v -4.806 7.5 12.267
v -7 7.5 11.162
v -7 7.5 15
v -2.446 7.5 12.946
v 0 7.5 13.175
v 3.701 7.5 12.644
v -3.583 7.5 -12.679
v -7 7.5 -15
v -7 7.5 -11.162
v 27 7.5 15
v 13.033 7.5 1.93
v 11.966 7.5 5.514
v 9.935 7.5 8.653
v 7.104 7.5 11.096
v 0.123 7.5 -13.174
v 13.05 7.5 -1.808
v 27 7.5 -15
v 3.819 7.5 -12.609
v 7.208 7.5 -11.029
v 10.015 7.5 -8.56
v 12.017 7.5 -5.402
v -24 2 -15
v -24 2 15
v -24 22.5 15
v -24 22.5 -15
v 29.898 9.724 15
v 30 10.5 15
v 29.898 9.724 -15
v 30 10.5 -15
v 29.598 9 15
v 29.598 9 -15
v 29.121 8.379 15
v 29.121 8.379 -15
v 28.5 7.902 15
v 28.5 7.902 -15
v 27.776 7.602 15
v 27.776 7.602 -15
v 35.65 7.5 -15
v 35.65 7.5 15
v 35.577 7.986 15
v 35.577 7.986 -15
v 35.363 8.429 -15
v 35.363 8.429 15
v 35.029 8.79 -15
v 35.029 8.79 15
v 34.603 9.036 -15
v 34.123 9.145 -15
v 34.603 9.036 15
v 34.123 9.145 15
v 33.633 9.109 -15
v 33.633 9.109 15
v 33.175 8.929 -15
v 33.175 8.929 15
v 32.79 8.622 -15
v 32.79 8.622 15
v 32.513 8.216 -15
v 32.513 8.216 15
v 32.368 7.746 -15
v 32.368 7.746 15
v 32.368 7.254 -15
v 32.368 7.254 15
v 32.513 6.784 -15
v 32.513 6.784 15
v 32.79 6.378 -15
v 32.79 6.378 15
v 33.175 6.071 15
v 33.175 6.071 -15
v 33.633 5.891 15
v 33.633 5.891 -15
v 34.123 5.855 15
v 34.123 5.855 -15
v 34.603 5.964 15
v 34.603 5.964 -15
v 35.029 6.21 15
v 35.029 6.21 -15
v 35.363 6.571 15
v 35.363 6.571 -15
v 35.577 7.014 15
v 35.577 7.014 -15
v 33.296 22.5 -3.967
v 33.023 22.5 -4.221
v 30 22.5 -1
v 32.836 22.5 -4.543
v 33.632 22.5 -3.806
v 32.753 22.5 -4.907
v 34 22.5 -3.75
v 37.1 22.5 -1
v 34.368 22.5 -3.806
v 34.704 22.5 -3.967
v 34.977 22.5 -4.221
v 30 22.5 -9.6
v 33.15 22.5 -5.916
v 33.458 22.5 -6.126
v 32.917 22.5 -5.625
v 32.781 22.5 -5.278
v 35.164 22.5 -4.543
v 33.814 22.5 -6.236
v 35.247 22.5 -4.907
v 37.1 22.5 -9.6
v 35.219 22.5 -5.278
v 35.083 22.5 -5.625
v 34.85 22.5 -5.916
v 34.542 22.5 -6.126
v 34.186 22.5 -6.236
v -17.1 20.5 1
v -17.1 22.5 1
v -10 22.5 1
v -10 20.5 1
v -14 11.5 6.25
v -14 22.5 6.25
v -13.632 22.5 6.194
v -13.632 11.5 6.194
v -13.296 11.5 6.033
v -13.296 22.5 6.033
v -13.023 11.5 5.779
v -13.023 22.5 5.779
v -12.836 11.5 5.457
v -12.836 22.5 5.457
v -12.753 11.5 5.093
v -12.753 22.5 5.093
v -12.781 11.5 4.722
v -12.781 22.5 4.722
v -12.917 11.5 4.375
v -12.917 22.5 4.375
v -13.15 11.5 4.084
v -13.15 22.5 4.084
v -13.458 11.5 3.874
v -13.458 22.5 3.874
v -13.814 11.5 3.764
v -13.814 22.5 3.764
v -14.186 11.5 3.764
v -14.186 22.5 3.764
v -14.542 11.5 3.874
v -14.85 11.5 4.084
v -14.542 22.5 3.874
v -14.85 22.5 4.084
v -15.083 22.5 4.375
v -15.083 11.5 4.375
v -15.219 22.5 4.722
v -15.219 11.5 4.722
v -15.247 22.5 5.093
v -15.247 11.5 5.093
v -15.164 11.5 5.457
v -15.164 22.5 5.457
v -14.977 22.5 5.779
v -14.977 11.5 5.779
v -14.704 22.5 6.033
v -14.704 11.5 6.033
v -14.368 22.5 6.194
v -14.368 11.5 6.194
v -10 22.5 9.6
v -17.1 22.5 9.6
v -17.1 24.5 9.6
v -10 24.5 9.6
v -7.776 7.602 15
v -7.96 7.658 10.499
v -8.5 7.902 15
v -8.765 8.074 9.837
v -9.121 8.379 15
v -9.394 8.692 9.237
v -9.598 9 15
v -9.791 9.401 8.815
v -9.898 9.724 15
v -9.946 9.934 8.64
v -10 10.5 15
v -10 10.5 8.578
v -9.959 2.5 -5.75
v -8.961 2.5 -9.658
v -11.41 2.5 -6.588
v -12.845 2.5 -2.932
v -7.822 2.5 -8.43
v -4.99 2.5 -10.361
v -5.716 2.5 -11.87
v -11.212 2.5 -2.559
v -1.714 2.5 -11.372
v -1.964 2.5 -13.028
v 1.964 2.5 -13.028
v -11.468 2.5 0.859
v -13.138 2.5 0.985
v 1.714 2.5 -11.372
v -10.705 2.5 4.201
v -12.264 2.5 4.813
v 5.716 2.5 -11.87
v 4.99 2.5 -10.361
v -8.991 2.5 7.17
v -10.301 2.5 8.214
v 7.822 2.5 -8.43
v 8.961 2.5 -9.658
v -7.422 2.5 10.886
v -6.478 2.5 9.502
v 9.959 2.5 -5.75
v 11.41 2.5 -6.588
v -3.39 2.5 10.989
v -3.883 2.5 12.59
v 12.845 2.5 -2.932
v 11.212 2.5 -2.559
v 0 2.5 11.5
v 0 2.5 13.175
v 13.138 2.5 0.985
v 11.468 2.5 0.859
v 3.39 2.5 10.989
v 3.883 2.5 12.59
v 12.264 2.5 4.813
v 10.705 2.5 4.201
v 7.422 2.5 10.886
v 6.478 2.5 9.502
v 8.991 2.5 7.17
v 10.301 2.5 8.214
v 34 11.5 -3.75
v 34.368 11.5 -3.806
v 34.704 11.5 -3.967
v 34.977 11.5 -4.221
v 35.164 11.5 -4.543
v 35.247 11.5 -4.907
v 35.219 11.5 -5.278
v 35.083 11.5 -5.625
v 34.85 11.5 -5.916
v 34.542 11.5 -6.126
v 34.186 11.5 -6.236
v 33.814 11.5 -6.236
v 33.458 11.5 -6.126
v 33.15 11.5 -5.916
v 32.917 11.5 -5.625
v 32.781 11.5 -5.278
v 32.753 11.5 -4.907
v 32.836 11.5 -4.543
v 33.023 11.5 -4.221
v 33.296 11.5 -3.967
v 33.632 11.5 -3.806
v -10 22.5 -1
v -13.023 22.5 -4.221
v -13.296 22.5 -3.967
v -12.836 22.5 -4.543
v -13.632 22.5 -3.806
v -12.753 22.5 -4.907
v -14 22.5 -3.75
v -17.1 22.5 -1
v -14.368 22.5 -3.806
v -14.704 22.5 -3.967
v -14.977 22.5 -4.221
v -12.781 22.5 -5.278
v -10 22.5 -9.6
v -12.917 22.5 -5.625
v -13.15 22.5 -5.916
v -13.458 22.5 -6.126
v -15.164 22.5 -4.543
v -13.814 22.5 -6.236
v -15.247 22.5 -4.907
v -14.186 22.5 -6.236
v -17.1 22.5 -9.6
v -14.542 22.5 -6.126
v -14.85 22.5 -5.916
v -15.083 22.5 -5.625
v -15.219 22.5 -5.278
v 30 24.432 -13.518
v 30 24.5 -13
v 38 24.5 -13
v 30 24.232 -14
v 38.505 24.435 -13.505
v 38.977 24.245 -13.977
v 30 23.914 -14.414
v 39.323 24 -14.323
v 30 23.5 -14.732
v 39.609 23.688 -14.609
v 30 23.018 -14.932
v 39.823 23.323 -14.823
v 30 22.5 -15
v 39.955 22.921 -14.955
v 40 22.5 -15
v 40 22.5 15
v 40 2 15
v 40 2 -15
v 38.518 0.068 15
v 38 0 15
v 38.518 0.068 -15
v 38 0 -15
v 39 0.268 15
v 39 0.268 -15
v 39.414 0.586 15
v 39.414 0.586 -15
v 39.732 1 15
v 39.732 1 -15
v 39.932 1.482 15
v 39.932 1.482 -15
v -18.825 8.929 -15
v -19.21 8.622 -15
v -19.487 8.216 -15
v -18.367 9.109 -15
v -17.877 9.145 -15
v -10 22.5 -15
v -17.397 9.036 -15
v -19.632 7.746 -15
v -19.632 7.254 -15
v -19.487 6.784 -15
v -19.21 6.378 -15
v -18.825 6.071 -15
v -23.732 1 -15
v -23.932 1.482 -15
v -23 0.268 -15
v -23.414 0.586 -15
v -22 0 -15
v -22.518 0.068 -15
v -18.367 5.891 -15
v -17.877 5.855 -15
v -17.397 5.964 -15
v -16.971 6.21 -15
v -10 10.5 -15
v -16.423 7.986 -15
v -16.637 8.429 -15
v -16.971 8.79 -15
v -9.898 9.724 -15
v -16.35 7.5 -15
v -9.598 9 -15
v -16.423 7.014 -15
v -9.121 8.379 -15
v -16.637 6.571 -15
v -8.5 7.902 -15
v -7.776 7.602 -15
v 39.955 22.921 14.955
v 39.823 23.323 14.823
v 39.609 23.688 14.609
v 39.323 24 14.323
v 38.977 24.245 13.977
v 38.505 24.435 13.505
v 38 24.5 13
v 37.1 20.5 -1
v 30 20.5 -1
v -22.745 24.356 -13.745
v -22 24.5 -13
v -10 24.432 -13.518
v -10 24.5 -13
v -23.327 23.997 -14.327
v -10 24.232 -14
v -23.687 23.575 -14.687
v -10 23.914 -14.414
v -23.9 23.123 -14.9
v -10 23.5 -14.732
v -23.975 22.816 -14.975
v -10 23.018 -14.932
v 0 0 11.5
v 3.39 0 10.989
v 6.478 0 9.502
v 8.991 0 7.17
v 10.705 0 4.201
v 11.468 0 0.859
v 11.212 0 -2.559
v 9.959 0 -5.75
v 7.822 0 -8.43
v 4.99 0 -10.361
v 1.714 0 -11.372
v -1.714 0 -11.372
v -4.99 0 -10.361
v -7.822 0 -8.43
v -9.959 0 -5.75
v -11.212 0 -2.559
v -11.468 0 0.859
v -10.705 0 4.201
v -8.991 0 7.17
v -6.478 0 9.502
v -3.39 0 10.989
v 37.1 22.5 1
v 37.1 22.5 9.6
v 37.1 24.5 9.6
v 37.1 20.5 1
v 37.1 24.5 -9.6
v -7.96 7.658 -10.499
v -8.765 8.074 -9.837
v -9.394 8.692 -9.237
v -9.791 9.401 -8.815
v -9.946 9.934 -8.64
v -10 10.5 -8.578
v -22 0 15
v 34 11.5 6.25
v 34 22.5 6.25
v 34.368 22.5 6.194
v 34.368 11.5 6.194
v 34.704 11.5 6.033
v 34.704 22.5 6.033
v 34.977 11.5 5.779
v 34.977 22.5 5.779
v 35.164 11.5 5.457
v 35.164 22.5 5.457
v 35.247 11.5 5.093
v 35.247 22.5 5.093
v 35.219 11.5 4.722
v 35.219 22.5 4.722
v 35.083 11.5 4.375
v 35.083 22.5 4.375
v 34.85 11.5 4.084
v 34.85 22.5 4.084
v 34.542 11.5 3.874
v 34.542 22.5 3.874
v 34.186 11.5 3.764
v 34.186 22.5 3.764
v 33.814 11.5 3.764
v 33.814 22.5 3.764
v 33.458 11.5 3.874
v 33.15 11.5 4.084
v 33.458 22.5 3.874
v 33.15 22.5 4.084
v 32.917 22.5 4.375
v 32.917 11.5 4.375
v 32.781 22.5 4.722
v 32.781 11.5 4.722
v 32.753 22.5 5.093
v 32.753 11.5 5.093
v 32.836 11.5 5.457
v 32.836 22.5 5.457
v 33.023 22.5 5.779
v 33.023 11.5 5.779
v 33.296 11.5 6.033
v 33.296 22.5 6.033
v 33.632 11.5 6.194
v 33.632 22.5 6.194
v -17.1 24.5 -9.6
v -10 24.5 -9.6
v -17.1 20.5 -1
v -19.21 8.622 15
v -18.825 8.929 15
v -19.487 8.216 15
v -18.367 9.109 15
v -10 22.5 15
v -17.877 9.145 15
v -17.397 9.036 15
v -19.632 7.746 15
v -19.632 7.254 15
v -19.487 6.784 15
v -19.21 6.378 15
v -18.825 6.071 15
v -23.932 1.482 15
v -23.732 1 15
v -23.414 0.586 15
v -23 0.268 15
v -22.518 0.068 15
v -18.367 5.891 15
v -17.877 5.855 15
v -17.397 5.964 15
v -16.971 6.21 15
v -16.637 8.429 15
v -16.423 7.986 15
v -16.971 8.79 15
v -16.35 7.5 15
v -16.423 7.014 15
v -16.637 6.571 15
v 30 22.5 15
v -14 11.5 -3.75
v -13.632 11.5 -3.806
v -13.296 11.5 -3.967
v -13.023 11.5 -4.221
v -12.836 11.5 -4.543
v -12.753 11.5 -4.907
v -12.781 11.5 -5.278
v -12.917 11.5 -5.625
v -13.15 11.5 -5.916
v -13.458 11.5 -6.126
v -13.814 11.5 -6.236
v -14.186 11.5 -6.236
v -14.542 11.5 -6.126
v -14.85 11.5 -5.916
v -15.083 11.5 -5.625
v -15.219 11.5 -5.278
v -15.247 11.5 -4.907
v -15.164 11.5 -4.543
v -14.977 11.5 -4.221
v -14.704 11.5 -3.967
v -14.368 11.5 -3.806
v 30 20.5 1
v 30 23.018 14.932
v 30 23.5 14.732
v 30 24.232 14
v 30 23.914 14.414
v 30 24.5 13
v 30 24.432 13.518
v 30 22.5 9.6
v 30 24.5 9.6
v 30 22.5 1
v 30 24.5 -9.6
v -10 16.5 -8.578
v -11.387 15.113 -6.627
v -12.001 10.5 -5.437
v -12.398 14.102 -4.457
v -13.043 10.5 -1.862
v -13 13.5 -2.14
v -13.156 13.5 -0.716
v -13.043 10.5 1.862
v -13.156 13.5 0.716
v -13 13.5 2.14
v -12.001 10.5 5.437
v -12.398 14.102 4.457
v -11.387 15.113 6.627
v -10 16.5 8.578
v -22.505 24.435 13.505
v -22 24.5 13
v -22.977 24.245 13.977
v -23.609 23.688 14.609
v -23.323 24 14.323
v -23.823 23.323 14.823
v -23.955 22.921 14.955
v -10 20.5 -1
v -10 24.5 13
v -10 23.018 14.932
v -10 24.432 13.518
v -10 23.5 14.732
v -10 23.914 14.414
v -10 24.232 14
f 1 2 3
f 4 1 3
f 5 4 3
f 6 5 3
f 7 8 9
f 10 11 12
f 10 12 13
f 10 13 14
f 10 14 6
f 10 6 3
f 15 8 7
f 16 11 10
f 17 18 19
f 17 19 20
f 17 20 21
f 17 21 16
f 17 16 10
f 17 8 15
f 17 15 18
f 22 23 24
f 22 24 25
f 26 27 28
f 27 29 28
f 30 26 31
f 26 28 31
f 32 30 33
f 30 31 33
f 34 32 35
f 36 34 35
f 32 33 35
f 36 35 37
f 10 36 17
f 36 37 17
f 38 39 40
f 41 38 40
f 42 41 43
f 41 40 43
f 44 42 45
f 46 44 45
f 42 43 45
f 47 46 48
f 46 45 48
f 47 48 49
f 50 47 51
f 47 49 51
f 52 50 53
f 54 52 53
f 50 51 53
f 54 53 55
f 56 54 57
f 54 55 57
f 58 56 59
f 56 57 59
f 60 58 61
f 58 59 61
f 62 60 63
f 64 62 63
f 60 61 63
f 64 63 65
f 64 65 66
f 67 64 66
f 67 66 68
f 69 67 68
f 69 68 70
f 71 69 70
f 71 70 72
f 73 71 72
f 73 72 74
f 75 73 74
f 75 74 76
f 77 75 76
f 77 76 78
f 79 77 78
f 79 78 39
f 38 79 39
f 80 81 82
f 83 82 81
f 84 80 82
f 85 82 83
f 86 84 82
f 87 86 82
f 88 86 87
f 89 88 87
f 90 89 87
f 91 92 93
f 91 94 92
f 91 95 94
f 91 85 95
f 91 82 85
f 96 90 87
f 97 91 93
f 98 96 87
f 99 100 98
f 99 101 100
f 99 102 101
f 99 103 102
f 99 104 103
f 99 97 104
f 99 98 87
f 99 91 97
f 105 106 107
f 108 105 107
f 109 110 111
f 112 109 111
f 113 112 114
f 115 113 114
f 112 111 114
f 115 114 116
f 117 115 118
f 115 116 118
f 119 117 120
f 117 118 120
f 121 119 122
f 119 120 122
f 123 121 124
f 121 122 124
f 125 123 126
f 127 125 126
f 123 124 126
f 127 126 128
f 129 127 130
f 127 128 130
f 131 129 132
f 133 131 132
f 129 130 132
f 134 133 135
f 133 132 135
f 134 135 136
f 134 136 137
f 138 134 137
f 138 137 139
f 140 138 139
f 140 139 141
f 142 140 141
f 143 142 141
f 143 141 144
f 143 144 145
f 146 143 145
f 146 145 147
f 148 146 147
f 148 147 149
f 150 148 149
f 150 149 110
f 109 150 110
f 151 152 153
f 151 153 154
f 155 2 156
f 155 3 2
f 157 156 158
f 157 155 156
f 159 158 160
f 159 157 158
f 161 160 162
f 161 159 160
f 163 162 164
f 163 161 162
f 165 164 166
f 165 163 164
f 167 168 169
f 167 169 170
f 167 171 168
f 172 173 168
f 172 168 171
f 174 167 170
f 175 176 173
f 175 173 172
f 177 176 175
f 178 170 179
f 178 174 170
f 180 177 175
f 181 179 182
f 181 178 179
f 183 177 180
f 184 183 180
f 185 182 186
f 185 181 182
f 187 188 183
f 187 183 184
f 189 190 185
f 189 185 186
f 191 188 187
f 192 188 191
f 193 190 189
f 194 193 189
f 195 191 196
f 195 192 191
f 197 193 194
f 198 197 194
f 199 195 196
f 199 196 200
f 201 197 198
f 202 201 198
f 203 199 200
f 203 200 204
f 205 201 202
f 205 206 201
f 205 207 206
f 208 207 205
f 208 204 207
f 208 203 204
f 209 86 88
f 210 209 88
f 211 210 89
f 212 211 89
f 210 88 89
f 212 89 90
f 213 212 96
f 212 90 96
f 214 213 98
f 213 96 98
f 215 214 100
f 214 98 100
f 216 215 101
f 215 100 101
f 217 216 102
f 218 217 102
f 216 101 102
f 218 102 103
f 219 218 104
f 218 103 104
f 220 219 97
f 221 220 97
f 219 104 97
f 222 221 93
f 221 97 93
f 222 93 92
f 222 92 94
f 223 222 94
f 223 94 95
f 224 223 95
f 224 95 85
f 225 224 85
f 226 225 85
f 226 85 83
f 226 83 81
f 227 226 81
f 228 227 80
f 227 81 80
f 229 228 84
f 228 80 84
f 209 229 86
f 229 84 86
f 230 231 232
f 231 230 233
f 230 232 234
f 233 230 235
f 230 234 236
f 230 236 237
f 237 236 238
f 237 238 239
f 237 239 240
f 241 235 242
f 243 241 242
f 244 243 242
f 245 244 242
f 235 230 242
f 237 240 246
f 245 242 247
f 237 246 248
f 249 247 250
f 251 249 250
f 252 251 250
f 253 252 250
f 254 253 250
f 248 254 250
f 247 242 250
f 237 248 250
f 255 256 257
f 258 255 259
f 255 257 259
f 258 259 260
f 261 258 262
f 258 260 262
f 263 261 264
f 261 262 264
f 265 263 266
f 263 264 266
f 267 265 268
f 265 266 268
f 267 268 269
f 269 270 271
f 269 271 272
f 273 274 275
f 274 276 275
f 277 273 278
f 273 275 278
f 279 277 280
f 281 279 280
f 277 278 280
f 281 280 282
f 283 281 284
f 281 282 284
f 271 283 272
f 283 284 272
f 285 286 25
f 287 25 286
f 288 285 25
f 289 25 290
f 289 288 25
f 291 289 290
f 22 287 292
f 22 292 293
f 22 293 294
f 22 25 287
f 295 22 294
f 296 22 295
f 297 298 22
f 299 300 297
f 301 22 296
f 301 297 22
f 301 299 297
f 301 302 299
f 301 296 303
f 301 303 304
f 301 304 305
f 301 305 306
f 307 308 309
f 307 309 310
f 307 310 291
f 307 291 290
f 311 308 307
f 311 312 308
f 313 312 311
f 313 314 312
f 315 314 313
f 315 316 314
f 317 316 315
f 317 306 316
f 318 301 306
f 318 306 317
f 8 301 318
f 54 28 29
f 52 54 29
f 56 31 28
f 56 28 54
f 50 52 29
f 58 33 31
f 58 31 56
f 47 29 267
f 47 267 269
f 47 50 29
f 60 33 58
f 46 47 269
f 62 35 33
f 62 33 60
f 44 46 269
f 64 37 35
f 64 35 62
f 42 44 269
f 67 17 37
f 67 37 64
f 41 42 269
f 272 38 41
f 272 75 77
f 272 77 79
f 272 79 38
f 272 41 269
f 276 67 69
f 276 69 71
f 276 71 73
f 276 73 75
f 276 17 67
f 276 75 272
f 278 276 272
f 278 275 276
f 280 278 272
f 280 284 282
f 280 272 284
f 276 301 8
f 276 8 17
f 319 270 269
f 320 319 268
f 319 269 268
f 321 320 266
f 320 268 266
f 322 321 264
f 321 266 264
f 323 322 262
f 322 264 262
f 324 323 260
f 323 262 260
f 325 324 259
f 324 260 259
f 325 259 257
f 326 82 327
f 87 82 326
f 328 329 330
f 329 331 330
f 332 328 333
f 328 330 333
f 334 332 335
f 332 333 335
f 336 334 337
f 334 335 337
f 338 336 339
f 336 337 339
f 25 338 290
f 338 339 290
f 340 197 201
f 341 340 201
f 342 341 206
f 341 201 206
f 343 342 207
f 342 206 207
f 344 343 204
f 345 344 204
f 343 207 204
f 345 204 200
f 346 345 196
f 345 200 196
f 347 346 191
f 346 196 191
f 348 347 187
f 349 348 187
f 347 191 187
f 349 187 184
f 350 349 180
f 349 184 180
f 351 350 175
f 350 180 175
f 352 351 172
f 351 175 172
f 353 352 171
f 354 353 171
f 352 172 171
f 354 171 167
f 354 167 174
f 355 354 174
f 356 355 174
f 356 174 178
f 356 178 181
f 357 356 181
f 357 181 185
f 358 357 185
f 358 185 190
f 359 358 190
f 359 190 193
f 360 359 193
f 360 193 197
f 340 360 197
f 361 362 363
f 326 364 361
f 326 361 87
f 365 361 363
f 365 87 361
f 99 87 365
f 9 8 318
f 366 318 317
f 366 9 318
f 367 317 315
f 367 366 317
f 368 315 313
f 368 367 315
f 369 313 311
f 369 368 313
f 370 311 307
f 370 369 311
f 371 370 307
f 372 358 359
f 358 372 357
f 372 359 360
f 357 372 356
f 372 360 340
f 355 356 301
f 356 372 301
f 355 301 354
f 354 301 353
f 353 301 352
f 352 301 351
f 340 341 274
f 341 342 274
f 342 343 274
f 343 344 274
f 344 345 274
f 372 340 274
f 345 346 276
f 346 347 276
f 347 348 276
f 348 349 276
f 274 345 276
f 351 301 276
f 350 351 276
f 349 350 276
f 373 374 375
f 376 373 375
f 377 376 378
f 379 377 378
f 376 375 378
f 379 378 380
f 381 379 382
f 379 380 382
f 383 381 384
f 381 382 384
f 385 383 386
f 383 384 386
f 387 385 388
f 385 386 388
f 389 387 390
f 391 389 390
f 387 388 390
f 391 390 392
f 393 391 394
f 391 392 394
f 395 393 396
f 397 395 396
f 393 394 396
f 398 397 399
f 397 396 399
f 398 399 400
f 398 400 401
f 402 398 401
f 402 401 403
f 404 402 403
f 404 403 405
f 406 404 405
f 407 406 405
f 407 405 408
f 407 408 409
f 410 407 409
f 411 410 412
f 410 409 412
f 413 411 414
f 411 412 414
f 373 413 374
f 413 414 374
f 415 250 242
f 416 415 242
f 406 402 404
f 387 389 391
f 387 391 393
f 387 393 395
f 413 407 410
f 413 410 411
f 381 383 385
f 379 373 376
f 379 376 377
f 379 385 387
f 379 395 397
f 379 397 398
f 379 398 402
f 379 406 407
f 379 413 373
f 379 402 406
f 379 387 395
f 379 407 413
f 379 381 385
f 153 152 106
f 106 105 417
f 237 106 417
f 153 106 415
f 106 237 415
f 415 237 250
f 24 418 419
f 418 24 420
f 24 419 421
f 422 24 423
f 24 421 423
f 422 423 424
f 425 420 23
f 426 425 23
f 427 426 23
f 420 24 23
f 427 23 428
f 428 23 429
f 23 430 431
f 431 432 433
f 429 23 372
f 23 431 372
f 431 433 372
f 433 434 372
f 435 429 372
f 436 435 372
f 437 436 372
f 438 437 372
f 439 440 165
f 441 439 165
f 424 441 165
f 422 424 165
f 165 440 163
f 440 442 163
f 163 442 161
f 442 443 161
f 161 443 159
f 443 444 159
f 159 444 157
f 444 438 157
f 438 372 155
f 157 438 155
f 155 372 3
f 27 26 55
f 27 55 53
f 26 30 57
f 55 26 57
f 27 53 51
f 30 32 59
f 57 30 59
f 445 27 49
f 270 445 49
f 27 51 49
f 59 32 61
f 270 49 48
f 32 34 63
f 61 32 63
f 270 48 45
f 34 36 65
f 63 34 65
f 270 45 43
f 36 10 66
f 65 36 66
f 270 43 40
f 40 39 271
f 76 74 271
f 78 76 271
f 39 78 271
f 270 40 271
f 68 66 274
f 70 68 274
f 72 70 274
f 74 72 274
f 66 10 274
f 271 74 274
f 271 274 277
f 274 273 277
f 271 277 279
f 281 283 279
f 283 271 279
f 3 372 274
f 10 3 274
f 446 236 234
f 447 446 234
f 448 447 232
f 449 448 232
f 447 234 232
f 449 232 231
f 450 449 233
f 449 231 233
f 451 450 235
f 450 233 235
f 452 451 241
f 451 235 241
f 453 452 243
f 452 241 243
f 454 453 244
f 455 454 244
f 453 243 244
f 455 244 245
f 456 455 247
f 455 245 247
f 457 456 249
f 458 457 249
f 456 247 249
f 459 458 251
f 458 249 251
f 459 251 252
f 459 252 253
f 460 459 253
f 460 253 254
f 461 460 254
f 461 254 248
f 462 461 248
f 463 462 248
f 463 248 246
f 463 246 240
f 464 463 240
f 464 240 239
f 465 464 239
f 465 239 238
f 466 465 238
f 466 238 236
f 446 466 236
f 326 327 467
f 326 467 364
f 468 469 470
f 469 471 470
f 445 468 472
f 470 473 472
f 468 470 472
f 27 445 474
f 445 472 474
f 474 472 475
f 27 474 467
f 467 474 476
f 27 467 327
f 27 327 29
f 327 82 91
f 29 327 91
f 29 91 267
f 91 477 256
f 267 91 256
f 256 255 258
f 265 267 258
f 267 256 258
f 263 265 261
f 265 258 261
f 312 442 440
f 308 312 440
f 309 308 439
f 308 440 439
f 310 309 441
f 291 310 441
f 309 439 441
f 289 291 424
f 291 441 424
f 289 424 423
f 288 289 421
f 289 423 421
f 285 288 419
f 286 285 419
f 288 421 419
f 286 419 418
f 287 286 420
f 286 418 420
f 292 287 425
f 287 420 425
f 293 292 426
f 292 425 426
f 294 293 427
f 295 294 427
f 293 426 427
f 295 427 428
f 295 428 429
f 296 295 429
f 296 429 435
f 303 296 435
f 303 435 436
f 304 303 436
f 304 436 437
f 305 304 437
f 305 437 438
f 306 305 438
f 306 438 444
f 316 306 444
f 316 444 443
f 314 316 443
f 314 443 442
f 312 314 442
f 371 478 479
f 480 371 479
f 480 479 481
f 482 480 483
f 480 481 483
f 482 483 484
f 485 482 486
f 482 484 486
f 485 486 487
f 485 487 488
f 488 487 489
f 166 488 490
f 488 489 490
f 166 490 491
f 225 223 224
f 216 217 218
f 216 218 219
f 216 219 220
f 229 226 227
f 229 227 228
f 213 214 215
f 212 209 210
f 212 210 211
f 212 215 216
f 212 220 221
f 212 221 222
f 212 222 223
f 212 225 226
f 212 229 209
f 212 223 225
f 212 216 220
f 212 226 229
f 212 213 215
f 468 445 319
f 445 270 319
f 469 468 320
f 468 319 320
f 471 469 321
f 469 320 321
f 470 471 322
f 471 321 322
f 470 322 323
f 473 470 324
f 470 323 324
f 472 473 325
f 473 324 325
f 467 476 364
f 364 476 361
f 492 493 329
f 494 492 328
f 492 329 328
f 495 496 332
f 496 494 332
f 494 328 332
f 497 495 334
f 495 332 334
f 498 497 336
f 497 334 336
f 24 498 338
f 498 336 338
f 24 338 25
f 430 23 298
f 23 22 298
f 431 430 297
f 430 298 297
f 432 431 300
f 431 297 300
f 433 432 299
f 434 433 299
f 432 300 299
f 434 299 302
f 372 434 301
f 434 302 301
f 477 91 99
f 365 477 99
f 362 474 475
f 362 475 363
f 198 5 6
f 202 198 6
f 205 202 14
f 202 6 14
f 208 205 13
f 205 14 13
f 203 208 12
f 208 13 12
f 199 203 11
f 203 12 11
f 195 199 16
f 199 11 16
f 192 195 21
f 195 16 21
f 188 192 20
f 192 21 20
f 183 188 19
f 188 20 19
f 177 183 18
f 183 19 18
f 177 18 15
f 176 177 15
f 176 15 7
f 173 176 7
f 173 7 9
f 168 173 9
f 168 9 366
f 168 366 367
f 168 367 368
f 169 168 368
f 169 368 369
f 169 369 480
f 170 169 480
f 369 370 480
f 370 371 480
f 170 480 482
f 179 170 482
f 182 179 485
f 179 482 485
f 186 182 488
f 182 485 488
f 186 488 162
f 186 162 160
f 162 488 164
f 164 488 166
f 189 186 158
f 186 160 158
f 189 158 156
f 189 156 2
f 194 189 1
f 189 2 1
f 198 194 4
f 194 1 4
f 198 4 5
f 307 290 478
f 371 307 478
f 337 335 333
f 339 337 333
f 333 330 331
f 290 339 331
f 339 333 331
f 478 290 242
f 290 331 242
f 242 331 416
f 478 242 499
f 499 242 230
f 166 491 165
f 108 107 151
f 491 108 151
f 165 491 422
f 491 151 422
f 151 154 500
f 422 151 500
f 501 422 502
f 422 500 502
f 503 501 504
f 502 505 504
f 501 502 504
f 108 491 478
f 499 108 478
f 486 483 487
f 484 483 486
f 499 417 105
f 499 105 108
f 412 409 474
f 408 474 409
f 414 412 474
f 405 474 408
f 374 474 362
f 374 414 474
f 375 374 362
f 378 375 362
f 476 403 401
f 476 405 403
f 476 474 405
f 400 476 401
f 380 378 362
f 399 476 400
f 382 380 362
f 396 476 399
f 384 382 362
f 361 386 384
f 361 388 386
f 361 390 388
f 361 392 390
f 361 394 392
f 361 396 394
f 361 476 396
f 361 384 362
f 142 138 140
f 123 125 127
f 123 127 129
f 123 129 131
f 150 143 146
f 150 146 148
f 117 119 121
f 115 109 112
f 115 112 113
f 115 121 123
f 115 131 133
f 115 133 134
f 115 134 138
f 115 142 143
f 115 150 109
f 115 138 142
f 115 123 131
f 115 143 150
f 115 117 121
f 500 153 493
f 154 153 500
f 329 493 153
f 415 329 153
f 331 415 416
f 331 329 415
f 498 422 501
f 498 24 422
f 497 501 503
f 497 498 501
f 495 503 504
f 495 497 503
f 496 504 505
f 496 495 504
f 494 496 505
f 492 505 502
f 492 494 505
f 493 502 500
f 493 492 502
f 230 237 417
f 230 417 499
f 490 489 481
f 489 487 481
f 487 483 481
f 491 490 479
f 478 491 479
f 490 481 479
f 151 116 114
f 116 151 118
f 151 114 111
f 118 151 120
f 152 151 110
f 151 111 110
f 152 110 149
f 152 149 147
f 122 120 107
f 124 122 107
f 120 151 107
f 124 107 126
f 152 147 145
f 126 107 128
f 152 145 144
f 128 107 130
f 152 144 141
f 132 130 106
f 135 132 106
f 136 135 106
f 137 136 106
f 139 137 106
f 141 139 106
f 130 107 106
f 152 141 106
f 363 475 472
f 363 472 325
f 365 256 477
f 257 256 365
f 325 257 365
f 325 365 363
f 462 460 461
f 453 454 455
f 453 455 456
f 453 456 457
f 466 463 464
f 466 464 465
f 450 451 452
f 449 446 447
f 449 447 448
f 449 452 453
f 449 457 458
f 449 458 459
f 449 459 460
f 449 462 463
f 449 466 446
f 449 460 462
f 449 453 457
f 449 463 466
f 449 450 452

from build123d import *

# Parameters (mm, degrees)
SKETCH_1_W             = 64
SKETCH_1_H             = 30
EXTRUDE_555_DEPTH      = 7.5
SKETCH_2_R             = 13.175
CUT_EXTRUDE_693_DEPTH  = 5
SKETCH_4_R             = 11.5
CUT_EXTRUDE_912_DEPTH  = 44.011626335
EXTRUDE_START          = 3
SKETCH_8_W             = 64
SKETCH_8_H             = 30
SKETCH_8_R             = 13.175
EXTRUDE_1127_DEPTH     = 3
EXTRUDE_START_2        = 12
SKETCH_9_W             = 10
SKETCH_9_H             = 30
EXTRUDE_1452_DEPTH     = 12
SKETCH_10_R            = 1.25
CUT_EXTRUDE_1739_DEPTH = 11
SKETCH_11_R            = 1.65
CUT_EXTRUDE_2260_DEPTH = 55.829280499
SKETCH_12_W            = 10
SKETCH_12_H            = 5.4
EXTRUDE_2664_DEPTH     = 2
CUT_EXTRUDE_2902_DEPTH = 3
SKETCH_15_W            = 10
SKETCH_15_H            = 19.2
SKETCH_15_R            = 1.25
EXTRUDE_3173_DEPTH     = 9
CHAMFER_5_SIZE         = 3
SKETCH_17_W            = 2.9
SKETCH_17_H            = 19.2
EXTRUDE_3597_DEPTH     = 2
SKETCH_16_W            = 7.1
SKETCH_16_H            = 2
CUT_EXTRUDE_3878_DEPTH = 2
SKETCH_18_W            = 4
SKETCH_18_H            = 30
EXTRUDE_4043_DEPTH     = 14
FILLET_4_R             = 3
FILLET_5_R             = 2


with BuildPart() as part:
    # Эскиз1 → Extrude 555 (new body)
    with BuildSketch(Plane(origin=(0, 0, 0), x_dir=(1, 0, 0), z_dir=(0, 1, 0))):
        with Locations((8, 0)):
            Rectangle(SKETCH_1_W, SKETCH_1_H)
    extrude(amount=EXTRUDE_555_DEPTH)

    # Эскиз2 → Cut-Extrude 693 (cut)
    with BuildSketch(Plane(origin=(0, 7.5, 0), x_dir=(1, 0, 0), z_dir=(0, 1, 0))):
        with Locations(Location((0, 0, 0), (0, 0, 270))):
            Circle(SKETCH_2_R)
    extrude(amount=-CUT_EXTRUDE_693_DEPTH, mode=Mode.SUBTRACT)

    # Эскиз4 → Cut-Extrude 912 (cut, through all)
    with BuildSketch(Plane(origin=(0, 2.5, 0), x_dir=(1, 0, 0), z_dir=(0, 1, 0))):
        with Locations(Location((0, 0, 0), (0, 0, 270))):
            Circle(SKETCH_4_R)
    extrude(amount=-CUT_EXTRUDE_912_DEPTH, mode=Mode.SUBTRACT)

    # Эскиз8 → Extrude 1127 (add)
    with BuildSketch(Plane(origin=(0, 7.5, 0), x_dir=(1, 0, 0), z_dir=(0, 1, 0)).offset(EXTRUDE_START)):
        with Locations((8, 0)):
            Rectangle(SKETCH_8_W, SKETCH_8_H)
        with Locations(Location((0, 0, 0), (0, 0, 270))):
            Circle(SKETCH_8_R, mode=Mode.SUBTRACT)
    extrude(amount=-EXTRUDE_1127_DEPTH)

    # Эскиз9 → Extrude 1452 (add)
    with BuildSketch(Plane(origin=(0, 10.5, 0), x_dir=(1, 0, 0), z_dir=(0, 1, 0)).offset(EXTRUDE_START_2)):
        with BuildLine():
            Line((-20, 15), (-10, 15))
            Line((-10, 15), (-10, 8.577914956))
            ThreePointArc((-10, 8.577914956), (-13.175, 0), (-10, -8.577914956))
            Line((-10, -8.577914956), (-10, -15))
            Line((-10, -15), (-20, -15))
            Line((-20, -15), (-20, 15))
        make_face()
        with Locations((35, 0)):
            Rectangle(SKETCH_9_W, SKETCH_9_H)
    extrude(amount=-EXTRUDE_1452_DEPTH)

    # Эскиз10 → Cut-Extrude 1739 (cut)
    with BuildSketch(Plane(origin=(0, 22.5, 0), x_dir=(1, 0, 0), z_dir=(0, 1, 0))):
        with Locations(Location((-14, 5, 0), (0, 0, 270))):
            Circle(SKETCH_10_R)
        with Locations(Location((-14, -5, 0), (0, 0, 270))):
            Circle(SKETCH_10_R)
        with Locations(Location((34, -5, 0), (0, 0, 270))):
            Circle(SKETCH_10_R)
        with Locations(Location((34, 5, 0), (0, 0, 270))):
            Circle(SKETCH_10_R)
    extrude(amount=-CUT_EXTRUDE_1739_DEPTH, mode=Mode.SUBTRACT)

    # Эскиз11 → Cut-Extrude 2260 (cut, through all)
    with BuildSketch(Plane.XY.offset(15)):
        with Locations((-18, 7.5)):
            Circle(SKETCH_11_R)
        with Locations((34, 7.5)):
            Circle(SKETCH_11_R)
    extrude(amount=-CUT_EXTRUDE_2260_DEPTH, mode=Mode.SUBTRACT)

    # Эскиз12 → Extrude 2664 (add)
    with BuildSketch(Plane(origin=(0, 22.5, 0), x_dir=(1, 0, 0), z_dir=(0, 1, 0))):
        with Locations((-15, 12.3)):
            Rectangle(SKETCH_12_W, SKETCH_12_H)
        with Locations((-15, -12.3)):
            Rectangle(SKETCH_12_W, SKETCH_12_H)
        with Locations((35, -12.3)):
            Rectangle(SKETCH_12_W, SKETCH_12_H)
        with Locations((35, 12.3)):
            Rectangle(SKETCH_12_W, SKETCH_12_H)
    extrude(amount=EXTRUDE_2664_DEPTH)

    # Эскиз14 → Cut-Extrude 2902 (cut)
    with BuildSketch(Plane(origin=(0, 10.5, 0), x_dir=(1, 0, 0), z_dir=(0, 1, 0))):
        with BuildLine():
            Line((-10, 15), (-10, 8.577914956))
            ThreePointArc((-10, 8.577914956), (13.175, 0), (-10, -8.577914956))
            Line((-10, -8.577914956), (-10, -15))
            Line((-10, -15), (30, -15))
            Line((30, -15), (30, 15))
            Line((30, 15), (-10, 15))
        make_face()
    extrude(amount=-CUT_EXTRUDE_2902_DEPTH, mode=Mode.SUBTRACT)

    # Эскиз15 → Extrude 3173 (add)
    with BuildSketch(Plane(origin=(0, 22.5, 0), x_dir=(1, 0, 0), z_dir=(0, 1, 0))):
        with Locations((-15, 0)):
            Rectangle(SKETCH_15_W, SKETCH_15_H)
        with Locations(Location((-14, 5, 0), (0, 0, 270))):
            Circle(SKETCH_15_R, mode=Mode.SUBTRACT)
        with Locations(Location((-14, -5, 0), (0, 0, 270))):
            Circle(SKETCH_15_R, mode=Mode.SUBTRACT)
    extrude(amount=-EXTRUDE_3173_DEPTH)

    # Фаска5
    chamfer_5_edges = [part.edges().sort_by_distance(p)[0] for p in [
        (-10, 13.5, 0),
    ]]
    chamfer(chamfer_5_edges, length=CHAMFER_5_SIZE)

    # Эскиз17 → Extrude 3597 (add)
    with BuildSketch(Plane(origin=(0, 22.5, 0), x_dir=(1, 0, 0), z_dir=(0, 1, 0))):
        with Locations((-18.55, 0)):
            Rectangle(SKETCH_17_W, SKETCH_17_H)
        with Locations((38.55, 0)):
            Rectangle(SKETCH_17_W, SKETCH_17_H)
    extrude(amount=EXTRUDE_3597_DEPTH)

    # Эскиз16 → Cut-Extrude 3878 (cut)
    with BuildSketch(Plane(origin=(0, 22.5, 0), x_dir=(1, 0, 0), z_dir=(0, 1, 0))):
        with Locations((-13.55, 0)):
            Rectangle(SKETCH_16_W, SKETCH_16_H)
        with Locations((33.55, 0)):
            Rectangle(SKETCH_16_W, SKETCH_16_H)
    extrude(amount=-CUT_EXTRUDE_3878_DEPTH, mode=Mode.SUBTRACT)

    # Эскиз18 → Extrude 4043 (add)
    with BuildSketch(Plane(origin=(0, 10.5, 0), x_dir=(1, 0, 0), z_dir=(0, 1, 0))):
        with Locations((-22, 0)):
            Rectangle(SKETCH_18_W, SKETCH_18_H)
    extrude(amount=EXTRUDE_4043_DEPTH)

    # Скругление4
    fillet_4_edges = [part.edges().sort_by_distance(p)[0] for p in [
        (30, 7.5, 0),
        (-10, 7.5, 11.788957478),
        (-10, 7.5, -11.788957478),
    ]]
    fillet(fillet_4_edges, radius=FILLET_4_R)

    # Скругление5
    fillet_5_edges = [part.edges().sort_by_distance(p)[0] for p in [
        (-17, 24.5, 15),
        (40, 24.5, 0),
        (35, 24.5, 15),
        (35, 24.5, -15),
        (-24, 24.5, 0),
        (40, 0, 0),
        (-24, 0, 0),
        (-17, 24.5, -15),
    ]]
    fillet(fillet_5_edges, radius=FILLET_5_R)


solid = part.part
